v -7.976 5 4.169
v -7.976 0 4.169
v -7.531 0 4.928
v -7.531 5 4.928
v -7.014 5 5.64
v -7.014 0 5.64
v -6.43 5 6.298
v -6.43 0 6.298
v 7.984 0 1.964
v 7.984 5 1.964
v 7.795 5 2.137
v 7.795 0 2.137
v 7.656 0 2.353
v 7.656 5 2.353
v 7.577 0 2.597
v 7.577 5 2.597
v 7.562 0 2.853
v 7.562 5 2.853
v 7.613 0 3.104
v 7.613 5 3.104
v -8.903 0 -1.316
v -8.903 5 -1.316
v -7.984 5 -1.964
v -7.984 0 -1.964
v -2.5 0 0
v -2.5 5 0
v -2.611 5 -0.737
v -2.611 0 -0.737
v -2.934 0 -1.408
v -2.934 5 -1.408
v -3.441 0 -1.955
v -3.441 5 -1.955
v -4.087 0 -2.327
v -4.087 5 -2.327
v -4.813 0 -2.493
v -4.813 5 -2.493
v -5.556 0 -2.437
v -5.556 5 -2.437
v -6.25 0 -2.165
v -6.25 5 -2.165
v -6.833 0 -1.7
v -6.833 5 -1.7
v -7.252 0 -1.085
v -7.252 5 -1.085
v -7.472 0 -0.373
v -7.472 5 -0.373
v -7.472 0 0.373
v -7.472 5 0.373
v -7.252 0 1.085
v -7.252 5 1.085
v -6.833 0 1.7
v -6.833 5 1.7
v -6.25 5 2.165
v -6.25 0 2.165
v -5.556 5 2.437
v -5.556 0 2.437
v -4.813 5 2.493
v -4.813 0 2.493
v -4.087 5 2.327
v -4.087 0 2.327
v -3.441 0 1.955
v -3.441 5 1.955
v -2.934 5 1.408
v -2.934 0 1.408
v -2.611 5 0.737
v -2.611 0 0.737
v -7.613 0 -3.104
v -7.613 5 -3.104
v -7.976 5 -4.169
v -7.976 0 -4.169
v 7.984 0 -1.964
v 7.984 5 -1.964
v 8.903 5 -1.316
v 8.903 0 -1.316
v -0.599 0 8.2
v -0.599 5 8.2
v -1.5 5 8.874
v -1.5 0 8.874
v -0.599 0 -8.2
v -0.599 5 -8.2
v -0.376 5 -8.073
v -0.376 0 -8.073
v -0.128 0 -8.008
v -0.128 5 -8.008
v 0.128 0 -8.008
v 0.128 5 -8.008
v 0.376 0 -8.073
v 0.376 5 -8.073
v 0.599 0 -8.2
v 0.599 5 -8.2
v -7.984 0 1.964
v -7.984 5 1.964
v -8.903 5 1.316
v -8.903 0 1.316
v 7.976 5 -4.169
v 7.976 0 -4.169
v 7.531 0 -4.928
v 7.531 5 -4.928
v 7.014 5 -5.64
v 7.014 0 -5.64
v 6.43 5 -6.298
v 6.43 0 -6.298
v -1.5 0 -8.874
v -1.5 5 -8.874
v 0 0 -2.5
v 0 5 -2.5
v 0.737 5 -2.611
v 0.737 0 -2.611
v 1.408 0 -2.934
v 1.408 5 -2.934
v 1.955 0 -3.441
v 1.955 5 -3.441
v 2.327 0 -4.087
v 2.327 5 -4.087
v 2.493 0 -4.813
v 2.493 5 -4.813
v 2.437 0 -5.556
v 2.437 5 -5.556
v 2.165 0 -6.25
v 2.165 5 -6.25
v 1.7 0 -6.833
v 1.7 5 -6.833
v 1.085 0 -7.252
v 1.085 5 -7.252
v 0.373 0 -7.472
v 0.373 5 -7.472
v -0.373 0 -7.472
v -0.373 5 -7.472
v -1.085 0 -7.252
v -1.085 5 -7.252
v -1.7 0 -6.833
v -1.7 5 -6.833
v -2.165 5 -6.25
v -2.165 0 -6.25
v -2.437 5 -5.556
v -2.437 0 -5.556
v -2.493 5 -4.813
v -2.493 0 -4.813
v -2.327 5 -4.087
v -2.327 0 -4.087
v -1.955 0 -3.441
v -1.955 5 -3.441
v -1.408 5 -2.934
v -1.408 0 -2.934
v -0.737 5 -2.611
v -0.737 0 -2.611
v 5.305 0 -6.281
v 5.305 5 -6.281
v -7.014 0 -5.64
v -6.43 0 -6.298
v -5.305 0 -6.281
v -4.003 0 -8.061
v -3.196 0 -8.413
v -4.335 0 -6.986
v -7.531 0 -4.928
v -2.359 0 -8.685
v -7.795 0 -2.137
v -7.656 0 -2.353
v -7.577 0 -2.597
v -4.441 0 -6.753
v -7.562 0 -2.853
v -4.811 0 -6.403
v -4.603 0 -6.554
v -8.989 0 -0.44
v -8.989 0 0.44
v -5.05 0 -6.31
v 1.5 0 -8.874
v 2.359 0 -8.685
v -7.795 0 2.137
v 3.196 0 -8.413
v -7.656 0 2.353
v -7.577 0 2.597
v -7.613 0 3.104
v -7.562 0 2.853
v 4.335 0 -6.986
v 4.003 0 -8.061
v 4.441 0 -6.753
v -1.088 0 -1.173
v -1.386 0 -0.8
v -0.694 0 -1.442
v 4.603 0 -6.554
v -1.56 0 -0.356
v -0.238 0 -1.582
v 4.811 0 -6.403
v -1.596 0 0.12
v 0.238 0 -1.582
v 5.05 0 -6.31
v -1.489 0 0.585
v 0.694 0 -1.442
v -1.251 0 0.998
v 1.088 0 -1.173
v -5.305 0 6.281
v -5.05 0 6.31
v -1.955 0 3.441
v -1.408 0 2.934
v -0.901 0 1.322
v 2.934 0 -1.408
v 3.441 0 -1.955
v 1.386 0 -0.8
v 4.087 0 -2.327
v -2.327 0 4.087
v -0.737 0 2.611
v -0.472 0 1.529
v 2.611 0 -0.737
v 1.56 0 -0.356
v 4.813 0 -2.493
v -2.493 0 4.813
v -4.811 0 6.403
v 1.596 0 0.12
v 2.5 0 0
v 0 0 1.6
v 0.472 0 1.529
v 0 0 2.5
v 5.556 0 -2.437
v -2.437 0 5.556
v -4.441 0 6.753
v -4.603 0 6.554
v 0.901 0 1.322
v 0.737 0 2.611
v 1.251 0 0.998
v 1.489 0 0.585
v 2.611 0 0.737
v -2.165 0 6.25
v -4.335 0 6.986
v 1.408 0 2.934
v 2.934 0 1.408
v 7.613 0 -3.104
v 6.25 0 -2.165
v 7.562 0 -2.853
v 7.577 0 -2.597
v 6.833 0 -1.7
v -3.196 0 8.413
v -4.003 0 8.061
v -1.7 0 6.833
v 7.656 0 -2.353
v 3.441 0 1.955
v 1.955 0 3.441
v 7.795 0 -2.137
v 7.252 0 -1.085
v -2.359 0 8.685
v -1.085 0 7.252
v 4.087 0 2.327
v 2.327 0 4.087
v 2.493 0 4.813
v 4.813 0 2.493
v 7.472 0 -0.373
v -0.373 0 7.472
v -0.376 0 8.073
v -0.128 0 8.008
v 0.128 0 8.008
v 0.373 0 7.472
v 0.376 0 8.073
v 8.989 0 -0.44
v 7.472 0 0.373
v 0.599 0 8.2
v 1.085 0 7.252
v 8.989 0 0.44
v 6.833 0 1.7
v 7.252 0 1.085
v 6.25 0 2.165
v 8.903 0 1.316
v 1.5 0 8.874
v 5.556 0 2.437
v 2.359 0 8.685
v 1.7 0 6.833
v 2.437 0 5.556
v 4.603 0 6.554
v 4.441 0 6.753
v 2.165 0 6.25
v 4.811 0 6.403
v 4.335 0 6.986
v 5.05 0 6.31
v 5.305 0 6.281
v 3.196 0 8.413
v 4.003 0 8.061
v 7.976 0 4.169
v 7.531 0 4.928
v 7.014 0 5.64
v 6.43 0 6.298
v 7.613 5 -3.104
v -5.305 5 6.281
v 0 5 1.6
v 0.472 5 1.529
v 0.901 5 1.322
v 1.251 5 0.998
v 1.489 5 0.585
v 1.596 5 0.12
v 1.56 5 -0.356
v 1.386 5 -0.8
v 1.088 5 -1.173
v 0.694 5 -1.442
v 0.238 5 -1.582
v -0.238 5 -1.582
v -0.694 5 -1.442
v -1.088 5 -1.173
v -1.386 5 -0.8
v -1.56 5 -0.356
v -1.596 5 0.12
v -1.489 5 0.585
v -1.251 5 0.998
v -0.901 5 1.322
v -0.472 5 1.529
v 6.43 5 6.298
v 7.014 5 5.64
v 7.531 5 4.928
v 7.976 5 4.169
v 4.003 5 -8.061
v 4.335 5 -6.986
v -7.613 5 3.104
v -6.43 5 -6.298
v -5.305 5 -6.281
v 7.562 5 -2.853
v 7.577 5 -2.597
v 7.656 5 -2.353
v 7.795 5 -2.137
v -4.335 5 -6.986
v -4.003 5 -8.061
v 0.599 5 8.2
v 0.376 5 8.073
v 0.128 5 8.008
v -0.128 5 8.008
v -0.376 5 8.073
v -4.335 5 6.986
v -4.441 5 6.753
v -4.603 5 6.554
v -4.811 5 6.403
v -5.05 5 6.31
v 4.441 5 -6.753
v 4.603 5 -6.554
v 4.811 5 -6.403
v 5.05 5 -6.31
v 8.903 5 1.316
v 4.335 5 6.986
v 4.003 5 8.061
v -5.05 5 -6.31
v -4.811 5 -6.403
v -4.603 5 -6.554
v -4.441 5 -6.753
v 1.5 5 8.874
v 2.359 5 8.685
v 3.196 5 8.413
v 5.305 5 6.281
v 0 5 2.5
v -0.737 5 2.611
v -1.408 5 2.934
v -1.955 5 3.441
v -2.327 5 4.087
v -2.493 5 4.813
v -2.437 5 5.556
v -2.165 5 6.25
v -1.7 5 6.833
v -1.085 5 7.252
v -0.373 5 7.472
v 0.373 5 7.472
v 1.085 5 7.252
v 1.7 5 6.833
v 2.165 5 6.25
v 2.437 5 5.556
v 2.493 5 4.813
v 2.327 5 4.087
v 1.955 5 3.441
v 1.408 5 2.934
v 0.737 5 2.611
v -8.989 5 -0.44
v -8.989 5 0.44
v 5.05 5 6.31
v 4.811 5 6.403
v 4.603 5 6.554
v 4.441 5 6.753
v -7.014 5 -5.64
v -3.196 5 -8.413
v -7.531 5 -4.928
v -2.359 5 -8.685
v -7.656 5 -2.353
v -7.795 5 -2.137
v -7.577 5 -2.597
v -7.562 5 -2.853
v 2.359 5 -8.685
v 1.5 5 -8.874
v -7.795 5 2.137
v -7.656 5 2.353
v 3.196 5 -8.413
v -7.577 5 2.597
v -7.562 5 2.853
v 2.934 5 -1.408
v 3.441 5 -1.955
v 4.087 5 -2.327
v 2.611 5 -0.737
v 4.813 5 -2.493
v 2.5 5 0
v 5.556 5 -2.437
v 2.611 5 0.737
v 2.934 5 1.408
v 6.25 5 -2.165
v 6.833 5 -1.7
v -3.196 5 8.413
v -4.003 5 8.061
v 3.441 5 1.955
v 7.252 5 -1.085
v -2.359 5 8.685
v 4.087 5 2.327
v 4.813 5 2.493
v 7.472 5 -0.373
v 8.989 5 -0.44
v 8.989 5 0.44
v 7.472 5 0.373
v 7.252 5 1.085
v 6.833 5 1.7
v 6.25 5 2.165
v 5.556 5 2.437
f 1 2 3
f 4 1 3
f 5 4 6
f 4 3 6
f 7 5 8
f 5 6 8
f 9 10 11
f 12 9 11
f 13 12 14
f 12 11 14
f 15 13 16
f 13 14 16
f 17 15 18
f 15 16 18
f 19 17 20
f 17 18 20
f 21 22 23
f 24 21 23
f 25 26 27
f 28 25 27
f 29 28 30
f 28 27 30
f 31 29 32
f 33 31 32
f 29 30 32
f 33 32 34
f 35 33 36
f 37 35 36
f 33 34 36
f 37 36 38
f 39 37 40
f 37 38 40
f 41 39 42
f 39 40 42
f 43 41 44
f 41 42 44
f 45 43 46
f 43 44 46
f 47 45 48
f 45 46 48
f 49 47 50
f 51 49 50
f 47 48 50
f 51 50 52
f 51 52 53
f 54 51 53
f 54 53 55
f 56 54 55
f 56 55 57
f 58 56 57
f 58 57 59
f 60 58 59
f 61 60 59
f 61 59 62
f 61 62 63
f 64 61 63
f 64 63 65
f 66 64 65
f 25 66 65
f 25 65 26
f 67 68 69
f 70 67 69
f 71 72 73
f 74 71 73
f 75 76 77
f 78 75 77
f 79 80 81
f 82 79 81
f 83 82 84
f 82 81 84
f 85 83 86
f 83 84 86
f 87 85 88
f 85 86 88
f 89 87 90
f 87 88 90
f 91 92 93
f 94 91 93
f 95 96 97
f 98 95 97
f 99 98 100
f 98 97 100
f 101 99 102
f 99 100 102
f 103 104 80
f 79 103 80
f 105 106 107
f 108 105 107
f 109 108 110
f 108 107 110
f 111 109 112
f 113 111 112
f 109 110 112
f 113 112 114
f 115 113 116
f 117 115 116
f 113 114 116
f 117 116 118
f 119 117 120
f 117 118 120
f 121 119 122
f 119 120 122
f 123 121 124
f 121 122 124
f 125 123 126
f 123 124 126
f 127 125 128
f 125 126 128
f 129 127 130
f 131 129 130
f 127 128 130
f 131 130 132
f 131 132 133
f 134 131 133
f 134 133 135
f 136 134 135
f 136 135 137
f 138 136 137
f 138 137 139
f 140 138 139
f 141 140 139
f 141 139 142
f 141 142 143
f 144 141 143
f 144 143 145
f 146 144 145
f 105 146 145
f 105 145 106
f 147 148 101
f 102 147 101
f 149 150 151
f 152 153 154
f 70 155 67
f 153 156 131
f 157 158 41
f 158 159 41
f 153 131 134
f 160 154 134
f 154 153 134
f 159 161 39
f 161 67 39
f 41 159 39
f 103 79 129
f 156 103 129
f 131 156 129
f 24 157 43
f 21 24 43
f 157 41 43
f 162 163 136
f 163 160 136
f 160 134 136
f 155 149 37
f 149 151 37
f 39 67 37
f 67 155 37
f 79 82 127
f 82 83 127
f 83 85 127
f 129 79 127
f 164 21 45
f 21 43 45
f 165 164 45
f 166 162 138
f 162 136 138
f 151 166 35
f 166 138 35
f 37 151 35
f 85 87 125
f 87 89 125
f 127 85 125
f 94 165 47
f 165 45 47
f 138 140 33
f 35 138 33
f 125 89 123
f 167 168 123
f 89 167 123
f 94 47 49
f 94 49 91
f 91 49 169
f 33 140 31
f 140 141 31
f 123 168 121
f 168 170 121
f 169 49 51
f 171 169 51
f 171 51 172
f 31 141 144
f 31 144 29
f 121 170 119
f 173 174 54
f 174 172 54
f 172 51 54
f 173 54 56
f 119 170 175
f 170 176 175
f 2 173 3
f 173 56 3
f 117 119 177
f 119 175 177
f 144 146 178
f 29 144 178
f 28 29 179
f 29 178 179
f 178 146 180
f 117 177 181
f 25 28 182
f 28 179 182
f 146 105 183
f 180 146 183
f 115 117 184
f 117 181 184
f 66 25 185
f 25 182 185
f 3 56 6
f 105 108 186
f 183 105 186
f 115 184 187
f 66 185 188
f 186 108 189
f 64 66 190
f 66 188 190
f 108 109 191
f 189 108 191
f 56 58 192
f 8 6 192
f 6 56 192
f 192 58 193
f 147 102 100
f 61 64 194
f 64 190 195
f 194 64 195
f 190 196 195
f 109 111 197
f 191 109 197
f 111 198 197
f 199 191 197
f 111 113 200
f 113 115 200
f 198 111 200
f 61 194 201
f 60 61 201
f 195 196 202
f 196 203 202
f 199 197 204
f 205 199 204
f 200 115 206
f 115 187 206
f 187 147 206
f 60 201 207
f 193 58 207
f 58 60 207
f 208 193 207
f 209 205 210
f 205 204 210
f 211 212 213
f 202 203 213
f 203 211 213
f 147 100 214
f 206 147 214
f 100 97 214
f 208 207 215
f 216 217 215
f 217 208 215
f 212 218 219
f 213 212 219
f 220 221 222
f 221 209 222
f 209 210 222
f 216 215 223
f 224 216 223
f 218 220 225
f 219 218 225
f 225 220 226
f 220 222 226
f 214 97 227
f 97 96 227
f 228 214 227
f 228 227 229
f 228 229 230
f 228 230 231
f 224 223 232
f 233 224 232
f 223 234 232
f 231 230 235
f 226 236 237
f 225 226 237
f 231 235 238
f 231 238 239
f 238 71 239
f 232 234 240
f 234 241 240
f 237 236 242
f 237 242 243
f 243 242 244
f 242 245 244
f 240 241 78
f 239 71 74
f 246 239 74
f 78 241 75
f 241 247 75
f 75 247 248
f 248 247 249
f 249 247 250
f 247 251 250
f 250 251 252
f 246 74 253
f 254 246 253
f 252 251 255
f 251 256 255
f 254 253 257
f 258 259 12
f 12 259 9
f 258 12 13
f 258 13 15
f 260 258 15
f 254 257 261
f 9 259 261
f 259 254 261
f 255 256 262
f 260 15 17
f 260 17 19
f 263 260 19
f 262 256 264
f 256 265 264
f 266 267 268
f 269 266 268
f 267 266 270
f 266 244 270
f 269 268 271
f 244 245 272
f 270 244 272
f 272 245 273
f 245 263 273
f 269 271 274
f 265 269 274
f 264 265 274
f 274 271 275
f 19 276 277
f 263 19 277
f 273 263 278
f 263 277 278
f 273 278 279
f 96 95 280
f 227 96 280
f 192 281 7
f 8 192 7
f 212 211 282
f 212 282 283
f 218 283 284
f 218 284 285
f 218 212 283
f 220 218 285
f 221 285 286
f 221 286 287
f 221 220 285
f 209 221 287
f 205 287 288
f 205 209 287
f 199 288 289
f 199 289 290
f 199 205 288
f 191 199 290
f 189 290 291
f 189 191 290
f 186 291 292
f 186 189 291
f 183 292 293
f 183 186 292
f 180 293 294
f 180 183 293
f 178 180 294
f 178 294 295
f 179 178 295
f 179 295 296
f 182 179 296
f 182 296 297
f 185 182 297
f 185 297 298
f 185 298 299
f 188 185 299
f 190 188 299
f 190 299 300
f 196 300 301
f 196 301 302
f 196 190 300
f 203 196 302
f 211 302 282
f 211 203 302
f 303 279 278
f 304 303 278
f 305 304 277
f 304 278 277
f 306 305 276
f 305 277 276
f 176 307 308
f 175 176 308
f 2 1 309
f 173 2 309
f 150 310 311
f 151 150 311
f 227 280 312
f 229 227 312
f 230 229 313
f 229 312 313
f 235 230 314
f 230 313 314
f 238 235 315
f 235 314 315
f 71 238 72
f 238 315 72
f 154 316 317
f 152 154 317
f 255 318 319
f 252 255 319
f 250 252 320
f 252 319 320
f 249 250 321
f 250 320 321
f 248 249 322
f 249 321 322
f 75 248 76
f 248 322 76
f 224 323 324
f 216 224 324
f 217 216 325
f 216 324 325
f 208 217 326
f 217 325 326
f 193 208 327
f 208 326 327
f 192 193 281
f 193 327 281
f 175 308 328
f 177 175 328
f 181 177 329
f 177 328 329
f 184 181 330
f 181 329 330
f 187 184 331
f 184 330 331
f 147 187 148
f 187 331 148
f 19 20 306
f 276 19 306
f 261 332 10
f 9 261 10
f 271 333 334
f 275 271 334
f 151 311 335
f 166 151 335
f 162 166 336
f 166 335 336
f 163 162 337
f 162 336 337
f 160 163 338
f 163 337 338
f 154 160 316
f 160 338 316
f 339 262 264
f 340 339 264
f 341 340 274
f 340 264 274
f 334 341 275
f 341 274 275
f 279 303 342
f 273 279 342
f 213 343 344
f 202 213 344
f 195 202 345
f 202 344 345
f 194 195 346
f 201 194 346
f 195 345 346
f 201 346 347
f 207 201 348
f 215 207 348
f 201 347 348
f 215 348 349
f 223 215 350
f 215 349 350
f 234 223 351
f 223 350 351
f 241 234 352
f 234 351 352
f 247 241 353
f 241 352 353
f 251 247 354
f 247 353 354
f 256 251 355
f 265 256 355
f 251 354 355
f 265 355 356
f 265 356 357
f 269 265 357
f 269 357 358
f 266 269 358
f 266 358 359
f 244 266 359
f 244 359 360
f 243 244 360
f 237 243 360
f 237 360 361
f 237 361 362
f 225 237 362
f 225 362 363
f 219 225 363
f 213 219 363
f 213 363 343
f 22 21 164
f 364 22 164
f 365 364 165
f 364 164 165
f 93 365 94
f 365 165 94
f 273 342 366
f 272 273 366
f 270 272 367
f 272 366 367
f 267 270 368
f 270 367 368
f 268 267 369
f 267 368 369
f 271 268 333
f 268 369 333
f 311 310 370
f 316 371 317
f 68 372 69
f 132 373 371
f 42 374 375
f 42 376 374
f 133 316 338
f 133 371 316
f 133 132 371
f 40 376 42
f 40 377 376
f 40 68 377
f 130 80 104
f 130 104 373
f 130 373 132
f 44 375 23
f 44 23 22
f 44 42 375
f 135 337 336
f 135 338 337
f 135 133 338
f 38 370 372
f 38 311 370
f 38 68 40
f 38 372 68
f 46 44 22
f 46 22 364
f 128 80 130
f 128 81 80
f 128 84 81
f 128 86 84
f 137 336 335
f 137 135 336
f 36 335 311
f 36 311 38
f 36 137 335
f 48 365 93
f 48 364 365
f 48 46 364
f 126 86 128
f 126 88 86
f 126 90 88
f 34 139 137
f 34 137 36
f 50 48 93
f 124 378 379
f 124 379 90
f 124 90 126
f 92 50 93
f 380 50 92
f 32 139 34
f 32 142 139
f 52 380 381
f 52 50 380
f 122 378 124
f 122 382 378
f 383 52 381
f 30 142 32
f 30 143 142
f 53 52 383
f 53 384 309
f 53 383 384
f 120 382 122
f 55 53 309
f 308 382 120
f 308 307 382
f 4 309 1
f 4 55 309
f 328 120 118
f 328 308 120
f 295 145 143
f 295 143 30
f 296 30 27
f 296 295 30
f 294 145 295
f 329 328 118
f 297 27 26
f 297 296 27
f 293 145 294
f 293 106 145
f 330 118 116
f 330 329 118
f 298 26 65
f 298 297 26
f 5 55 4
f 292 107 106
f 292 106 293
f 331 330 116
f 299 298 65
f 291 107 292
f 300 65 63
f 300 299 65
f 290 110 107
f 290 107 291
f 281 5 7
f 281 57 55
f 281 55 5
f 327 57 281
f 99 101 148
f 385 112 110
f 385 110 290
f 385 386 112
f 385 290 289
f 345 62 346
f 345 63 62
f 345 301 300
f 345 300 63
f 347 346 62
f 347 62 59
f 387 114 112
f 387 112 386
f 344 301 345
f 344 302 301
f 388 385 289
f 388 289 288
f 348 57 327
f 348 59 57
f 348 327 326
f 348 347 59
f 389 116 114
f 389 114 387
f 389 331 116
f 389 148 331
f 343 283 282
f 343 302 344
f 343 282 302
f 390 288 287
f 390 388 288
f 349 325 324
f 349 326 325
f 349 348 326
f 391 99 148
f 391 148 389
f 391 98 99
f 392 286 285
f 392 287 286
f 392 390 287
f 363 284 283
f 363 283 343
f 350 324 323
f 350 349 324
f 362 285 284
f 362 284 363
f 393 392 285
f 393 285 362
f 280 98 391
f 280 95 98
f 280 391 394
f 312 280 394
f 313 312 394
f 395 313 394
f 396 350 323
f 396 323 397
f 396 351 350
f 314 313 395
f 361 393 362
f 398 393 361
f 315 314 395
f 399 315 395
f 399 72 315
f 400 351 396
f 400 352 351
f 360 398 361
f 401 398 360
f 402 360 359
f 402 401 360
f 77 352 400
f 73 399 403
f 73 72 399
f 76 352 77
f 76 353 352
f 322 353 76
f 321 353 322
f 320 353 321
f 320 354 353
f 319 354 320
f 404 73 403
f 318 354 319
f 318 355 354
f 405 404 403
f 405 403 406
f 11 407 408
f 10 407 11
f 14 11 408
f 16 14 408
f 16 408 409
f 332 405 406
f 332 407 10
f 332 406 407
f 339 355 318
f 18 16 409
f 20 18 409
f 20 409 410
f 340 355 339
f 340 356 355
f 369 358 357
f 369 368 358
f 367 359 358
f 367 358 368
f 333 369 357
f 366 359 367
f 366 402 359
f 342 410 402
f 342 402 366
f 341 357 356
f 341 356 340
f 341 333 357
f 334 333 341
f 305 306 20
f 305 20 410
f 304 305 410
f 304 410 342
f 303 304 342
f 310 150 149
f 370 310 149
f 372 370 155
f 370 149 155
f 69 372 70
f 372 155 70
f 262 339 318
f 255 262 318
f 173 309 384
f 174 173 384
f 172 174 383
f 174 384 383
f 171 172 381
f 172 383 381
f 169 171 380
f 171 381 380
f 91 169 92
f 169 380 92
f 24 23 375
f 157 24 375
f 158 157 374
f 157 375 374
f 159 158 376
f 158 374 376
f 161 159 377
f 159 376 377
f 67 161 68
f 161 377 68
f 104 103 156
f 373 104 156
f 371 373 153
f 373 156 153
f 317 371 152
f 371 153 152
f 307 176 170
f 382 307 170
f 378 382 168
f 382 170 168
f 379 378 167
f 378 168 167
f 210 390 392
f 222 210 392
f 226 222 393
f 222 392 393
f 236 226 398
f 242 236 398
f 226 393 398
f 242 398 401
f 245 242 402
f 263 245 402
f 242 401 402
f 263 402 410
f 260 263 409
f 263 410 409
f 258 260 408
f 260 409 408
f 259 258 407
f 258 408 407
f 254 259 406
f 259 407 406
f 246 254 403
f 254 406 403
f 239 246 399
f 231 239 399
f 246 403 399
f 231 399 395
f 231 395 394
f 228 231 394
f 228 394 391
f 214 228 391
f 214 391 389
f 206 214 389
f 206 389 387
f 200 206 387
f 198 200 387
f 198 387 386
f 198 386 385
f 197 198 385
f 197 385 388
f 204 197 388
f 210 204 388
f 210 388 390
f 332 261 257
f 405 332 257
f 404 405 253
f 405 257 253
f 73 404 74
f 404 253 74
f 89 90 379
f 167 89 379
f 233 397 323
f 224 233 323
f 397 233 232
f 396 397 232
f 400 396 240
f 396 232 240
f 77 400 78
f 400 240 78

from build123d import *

# Parameters (mm, degrees)
SKETCH_1_R               = 9
SKETCH_1_R_2             = 1.6
EXTRUDE_1_DEPTH          = 5
CUT_EXTRUDE_2_REACH      = 15.675
PATTERN_CIRCULAR_1_COUNT = 10
CUT_EXTRUDE_1_REACH      = 15.592
SKETCH_3_R               = 2.5
PATTERN_CIRCULAR_2_COUNT = 4


with BuildPart() as part:
    # 草图1 → 凸台-拉伸1 (new body)
    with BuildSketch(Plane(origin=(0, 0, 0), x_dir=(1, 0, 0), z_dir=(0, 1, 0))):
        with Locations(Location((0, 0, 0), (0, 0, 270))):
            Circle(SKETCH_1_R)
        with Locations(Location((0, 0, 0), (0, 0, 270))):
            Circle(SKETCH_1_R_2, mode=Mode.SUBTRACT)
    extrude(amount=EXTRUDE_1_DEPTH)

    # 草图4 → 切除-拉伸2 (cut, up to next)
    with BuildSketch(Plane(origin=(0, 5, 0), x_dir=(1, 0, 0), z_dir=(0, 1, 0)), mode=Mode.PRIVATE) as cut_extrude_2_sk1:
        with BuildLine():
            Line((-1.5, 8.874119675), (-0.599498979, 8.19962448))
            ThreePointArc((-0.599498979, 8.19962448), (0, 8), (0.599498979, 8.19962448))
            Line((0.599498979, 8.19962448), (1.5, 8.874119675))
            ThreePointArc((1.5, 8.874119675), (0, 9), (-1.5, 8.874119675))
        make_face()
    cut_extrude_2_tool1 = extrude(cut_extrude_2_sk1.sketch, amount=-CUT_EXTRUDE_2_REACH, mode=Mode.PRIVATE) & part.part
    cut_extrude_2 = cut_extrude_2_tool1.solids().sort_by_distance((0, 5, -8.590322))[0]
    add(cut_extrude_2, mode=Mode.SUBTRACT)

    # 阵列(圆周)1: 切除-拉伸2 ×10 about axis
    pattern_circular_1_axis = Axis((0, 0, 0), (0, 1, 0))
    for i in range(1, PATTERN_CIRCULAR_1_COUNT):
        add(cut_extrude_2.rotate(pattern_circular_1_axis, i * 360 / PATTERN_CIRCULAR_1_COUNT), mode=Mode.SUBTRACT)

    # 草图3 → 切除-拉伸1 (cut, up to next)
    with BuildSketch(Plane(origin=(0, 5, 0), x_dir=(1, 0, 0), z_dir=(0, 1, 0)), mode=Mode.PRIVATE) as cut_extrude_1_sk1:
        with Locations(Location((0, 5, 0), (0, 0, 270))):
            Circle(SKETCH_3_R)
    cut_extrude_1_tool1 = extrude(cut_extrude_1_sk1.sketch, amount=-CUT_EXTRUDE_1_REACH, mode=Mode.PRIVATE) & part.part
    cut_extrude_1 = cut_extrude_1_tool1.solids().sort_by_distance((0, 5, -5))[0]
    add(cut_extrude_1, mode=Mode.SUBTRACT)

    # 阵列(圆周)2: 切除-拉伸1 ×4 about axis
    pattern_circular_2_axis = Axis((0, 0, 0), (0, 1, 0))
    for i in range(1, PATTERN_CIRCULAR_2_COUNT):
        add(cut_extrude_1.rotate(pattern_circular_2_axis, i * 360 / PATTERN_CIRCULAR_2_COUNT), mode=Mode.SUBTRACT)


solid = part.part
